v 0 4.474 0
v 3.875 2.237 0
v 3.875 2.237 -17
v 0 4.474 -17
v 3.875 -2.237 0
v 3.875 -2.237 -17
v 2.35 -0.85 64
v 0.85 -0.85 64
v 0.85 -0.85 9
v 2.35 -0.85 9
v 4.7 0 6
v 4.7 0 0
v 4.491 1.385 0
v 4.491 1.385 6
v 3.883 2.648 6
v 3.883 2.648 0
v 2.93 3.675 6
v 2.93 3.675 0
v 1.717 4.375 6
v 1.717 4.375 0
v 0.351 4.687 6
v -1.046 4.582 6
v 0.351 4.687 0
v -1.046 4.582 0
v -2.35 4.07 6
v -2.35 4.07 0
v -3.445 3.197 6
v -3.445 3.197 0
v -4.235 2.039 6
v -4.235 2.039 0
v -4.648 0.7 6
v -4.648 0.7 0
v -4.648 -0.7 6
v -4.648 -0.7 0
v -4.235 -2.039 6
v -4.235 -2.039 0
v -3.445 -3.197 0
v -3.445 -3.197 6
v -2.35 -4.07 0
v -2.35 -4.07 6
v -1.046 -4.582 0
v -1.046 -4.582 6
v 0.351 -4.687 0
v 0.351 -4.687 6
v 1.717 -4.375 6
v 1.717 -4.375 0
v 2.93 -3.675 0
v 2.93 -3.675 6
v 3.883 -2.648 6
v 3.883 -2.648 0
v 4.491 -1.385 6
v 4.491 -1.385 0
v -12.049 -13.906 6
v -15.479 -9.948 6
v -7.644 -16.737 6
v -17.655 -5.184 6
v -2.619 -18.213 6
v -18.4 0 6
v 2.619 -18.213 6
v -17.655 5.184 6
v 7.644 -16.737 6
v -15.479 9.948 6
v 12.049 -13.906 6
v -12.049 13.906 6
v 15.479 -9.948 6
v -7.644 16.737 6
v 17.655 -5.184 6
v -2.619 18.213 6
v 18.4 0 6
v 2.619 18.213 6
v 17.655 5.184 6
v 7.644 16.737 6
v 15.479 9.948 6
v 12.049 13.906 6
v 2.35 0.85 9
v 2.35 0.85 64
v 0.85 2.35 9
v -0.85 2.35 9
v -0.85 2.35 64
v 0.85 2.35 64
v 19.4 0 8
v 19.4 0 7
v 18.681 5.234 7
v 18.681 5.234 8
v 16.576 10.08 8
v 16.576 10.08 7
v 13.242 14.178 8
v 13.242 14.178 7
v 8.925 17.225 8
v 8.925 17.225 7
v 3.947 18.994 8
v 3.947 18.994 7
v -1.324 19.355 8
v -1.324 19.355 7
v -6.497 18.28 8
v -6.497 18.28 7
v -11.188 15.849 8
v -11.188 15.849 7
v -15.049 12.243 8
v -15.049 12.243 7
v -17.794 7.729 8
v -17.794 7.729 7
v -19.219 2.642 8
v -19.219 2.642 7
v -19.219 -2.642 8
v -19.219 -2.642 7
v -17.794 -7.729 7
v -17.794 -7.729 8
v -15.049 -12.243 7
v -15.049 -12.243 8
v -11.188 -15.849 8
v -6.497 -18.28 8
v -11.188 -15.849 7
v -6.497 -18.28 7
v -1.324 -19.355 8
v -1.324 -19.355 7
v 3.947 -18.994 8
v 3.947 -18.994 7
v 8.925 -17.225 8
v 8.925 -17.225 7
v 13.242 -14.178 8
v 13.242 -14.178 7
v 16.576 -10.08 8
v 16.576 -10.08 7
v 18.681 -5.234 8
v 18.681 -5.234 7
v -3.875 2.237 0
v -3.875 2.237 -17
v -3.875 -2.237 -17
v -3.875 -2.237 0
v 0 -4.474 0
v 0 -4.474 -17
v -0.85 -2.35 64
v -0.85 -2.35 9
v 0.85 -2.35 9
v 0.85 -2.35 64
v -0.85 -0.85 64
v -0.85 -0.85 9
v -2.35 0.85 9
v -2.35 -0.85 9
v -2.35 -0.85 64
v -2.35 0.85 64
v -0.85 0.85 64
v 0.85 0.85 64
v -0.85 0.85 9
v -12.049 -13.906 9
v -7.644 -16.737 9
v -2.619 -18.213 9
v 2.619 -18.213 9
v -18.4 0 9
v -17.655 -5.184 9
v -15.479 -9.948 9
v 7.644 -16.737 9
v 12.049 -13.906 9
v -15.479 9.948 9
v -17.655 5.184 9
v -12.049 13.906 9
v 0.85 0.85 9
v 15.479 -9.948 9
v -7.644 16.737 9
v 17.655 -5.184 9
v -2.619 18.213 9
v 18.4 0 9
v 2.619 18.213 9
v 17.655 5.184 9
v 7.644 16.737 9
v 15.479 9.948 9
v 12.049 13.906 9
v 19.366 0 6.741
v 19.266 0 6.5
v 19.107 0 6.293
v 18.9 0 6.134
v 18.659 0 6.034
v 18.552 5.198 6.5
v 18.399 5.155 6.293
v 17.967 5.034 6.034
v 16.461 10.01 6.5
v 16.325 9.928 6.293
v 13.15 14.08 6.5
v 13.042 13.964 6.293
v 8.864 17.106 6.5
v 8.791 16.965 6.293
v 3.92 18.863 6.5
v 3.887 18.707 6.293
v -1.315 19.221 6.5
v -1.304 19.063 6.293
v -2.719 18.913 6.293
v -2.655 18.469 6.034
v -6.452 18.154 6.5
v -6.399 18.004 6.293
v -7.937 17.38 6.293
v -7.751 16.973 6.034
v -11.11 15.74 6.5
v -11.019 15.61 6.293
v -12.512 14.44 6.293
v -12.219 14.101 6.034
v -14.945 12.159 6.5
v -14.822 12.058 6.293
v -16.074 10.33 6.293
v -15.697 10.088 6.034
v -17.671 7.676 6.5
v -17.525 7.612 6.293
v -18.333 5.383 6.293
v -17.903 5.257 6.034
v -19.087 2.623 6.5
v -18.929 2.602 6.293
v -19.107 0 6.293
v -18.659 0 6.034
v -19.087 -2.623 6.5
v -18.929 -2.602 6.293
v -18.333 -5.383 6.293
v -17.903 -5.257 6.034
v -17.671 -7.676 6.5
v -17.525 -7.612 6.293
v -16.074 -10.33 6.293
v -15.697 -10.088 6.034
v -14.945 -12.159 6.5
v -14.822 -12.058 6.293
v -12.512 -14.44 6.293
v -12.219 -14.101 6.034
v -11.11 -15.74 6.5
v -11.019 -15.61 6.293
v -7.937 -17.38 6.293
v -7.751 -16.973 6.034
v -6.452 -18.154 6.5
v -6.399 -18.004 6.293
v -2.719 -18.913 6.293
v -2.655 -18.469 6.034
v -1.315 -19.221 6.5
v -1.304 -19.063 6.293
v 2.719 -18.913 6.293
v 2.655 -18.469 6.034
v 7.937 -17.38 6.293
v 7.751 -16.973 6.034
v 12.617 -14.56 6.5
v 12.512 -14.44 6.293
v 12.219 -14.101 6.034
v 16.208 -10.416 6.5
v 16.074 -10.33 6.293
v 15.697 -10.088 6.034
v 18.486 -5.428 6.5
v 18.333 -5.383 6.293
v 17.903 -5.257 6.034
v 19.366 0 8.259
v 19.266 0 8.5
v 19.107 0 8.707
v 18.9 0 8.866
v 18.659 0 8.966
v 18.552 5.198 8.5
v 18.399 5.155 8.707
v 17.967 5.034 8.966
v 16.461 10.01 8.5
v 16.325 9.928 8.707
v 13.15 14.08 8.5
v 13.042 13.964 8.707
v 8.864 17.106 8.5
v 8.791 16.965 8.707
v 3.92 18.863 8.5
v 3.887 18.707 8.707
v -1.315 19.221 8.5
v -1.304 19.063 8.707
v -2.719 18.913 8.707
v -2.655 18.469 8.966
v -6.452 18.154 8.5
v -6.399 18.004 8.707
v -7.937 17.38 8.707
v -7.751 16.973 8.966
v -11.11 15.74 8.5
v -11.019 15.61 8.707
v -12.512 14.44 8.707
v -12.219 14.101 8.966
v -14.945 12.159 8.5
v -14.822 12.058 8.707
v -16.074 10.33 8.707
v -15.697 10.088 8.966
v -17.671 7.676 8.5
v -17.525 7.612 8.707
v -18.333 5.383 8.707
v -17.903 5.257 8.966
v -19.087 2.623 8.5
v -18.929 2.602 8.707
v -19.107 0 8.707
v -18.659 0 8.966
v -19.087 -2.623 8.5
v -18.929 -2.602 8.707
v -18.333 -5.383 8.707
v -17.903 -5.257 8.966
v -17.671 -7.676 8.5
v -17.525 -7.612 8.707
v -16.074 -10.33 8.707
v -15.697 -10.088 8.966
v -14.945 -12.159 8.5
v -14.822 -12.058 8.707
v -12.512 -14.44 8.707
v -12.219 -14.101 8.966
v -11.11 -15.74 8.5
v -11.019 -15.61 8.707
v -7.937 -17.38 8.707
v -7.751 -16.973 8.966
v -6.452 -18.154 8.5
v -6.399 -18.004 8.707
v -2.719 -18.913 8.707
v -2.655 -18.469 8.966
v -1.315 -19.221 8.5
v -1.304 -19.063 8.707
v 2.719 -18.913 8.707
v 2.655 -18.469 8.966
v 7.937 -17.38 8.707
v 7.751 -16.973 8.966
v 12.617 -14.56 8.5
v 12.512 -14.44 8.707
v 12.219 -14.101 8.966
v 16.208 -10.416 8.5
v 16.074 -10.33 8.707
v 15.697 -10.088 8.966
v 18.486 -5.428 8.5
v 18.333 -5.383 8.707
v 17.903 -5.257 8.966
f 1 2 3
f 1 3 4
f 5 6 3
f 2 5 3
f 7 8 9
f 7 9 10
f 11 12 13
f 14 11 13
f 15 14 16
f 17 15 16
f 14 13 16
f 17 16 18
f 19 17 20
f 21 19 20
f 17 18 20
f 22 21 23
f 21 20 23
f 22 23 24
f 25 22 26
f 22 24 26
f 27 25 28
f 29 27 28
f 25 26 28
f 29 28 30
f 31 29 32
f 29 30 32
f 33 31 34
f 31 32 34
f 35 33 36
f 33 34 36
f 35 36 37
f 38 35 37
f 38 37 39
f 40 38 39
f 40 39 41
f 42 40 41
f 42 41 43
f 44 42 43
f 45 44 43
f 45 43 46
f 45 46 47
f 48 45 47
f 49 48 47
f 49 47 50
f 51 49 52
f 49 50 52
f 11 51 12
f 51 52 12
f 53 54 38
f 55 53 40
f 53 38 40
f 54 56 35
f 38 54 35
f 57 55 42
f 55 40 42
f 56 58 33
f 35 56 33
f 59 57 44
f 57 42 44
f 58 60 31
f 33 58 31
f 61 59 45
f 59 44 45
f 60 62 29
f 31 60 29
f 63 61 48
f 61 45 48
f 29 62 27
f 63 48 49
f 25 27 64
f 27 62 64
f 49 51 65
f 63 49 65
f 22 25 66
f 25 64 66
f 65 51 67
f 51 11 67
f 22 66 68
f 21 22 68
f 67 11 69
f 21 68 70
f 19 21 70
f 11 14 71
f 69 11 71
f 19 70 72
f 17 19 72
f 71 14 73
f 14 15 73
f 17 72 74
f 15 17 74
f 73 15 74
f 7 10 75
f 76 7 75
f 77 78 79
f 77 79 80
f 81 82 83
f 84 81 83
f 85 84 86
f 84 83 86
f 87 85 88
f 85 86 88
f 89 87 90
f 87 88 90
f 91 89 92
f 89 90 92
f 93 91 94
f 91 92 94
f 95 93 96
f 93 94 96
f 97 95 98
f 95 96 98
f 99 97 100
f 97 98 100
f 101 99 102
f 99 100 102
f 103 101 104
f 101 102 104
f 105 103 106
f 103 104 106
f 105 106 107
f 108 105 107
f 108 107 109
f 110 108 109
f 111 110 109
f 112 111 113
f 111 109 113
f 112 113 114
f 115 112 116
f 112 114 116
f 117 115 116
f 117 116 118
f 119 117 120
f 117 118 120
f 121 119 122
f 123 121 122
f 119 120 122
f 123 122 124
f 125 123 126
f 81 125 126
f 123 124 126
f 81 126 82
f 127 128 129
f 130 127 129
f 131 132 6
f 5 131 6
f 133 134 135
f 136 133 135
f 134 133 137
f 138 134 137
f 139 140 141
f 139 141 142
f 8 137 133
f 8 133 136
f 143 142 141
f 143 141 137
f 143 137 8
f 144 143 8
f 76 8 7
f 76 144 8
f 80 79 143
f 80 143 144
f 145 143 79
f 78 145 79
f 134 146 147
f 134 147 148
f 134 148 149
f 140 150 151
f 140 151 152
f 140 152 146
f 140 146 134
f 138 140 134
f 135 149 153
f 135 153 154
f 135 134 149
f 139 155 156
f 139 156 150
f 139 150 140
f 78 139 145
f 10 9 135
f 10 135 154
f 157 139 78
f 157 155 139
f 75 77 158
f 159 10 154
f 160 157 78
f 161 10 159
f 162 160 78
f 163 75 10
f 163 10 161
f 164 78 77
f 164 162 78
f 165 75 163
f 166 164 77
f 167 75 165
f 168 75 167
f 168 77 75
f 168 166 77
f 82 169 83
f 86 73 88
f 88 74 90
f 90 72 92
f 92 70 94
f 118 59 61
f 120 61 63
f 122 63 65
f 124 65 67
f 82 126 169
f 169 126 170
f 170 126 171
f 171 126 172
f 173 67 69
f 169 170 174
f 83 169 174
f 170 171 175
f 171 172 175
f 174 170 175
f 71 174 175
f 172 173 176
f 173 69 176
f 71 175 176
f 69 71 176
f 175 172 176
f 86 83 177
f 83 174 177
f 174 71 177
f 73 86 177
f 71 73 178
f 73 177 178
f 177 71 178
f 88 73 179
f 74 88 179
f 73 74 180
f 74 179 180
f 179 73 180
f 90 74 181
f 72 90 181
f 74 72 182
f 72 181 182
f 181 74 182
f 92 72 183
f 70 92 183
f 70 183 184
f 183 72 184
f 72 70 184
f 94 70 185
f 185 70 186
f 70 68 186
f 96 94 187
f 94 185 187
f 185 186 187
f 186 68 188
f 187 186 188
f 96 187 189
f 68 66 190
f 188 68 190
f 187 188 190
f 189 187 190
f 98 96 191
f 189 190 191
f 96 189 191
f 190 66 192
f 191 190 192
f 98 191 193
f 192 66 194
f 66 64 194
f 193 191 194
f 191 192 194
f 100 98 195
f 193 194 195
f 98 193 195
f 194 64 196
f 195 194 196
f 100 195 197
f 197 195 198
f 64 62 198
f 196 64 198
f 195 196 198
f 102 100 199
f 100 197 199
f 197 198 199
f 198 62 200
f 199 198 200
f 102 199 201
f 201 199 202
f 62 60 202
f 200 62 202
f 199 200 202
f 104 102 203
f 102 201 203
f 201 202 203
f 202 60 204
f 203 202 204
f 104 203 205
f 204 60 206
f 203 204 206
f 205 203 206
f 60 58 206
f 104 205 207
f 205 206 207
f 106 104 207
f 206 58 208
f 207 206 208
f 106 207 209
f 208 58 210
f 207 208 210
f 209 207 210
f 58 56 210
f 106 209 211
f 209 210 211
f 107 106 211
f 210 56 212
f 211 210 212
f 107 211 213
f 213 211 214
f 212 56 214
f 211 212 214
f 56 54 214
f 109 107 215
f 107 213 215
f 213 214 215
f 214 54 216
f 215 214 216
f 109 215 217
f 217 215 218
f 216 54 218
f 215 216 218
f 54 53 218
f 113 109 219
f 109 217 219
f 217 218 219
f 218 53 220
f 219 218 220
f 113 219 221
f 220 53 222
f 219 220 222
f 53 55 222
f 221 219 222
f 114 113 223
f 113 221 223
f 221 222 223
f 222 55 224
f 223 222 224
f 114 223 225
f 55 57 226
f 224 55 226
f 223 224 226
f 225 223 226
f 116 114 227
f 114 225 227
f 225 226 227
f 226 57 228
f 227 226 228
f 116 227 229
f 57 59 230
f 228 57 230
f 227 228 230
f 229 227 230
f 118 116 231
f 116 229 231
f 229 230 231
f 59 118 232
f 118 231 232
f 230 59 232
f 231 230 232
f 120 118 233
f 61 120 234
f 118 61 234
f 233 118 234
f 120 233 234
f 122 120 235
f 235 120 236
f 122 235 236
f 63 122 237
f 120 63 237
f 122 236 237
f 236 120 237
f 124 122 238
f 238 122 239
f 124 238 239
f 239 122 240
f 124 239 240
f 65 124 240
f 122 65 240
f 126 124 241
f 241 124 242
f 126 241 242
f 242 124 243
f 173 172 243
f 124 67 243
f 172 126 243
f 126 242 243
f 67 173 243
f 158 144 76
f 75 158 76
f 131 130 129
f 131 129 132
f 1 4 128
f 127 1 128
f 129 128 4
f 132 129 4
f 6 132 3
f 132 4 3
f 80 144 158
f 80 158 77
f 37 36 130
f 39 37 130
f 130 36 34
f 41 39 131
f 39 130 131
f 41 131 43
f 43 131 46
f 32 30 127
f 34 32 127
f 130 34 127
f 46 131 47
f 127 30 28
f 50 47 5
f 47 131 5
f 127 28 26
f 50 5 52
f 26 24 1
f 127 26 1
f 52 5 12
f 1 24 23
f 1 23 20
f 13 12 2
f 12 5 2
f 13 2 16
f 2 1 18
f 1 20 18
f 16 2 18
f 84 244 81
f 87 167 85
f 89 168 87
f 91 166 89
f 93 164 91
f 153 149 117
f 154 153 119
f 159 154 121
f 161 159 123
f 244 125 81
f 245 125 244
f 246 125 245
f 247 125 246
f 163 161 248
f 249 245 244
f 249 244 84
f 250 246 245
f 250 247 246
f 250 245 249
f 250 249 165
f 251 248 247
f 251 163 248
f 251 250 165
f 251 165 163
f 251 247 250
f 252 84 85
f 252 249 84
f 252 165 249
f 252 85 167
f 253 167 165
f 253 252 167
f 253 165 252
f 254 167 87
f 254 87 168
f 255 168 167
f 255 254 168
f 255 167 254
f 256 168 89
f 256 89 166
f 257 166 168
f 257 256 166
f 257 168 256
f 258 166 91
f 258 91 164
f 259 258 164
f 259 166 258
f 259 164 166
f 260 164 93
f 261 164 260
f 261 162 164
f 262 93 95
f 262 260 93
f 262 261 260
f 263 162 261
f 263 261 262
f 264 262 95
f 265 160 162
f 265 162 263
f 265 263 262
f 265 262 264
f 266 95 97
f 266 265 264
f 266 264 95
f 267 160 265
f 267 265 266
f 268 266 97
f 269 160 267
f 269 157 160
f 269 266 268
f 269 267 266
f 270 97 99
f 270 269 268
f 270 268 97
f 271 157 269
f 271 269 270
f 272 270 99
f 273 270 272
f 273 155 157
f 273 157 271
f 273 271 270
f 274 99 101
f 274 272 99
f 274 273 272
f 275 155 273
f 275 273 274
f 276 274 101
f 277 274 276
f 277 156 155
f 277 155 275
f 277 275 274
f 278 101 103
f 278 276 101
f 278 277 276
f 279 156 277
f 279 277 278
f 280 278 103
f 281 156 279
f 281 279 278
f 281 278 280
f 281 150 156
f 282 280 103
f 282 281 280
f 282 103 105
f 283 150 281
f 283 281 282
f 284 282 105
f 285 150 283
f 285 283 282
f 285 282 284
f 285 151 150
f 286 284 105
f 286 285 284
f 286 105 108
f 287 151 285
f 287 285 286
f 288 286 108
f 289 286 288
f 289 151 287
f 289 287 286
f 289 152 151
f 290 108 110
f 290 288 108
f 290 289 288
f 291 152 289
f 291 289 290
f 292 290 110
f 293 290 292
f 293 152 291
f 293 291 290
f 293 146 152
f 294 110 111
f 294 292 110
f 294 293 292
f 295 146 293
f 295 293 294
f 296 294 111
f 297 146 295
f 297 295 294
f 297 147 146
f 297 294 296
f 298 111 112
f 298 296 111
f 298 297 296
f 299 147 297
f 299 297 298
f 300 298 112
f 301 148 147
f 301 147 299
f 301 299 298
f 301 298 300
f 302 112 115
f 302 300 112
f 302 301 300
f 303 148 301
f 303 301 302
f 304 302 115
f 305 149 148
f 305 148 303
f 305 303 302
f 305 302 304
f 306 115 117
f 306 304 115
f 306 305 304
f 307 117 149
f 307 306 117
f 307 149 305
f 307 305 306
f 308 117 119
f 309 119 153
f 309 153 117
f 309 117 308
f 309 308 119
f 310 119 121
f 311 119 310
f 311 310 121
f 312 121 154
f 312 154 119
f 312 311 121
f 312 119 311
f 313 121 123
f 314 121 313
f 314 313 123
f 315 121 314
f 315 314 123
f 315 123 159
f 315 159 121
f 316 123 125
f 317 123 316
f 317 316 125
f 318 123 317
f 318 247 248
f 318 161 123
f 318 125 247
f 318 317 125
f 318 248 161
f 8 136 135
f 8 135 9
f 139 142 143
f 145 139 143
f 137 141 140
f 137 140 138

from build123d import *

# Parameters (mm, degrees)
F1_DEPTH = 17
F2_R     = 4.7
F3_DEPTH = 6
F4_R     = 19.4
F5_DEPTH = 3
F6_W     = 1.5
F6_H     = 1.7
F6_W_2   = 1.7
F6_H_2   = 1.5
F7_DEPTH = 55
F8_R     = 1


with BuildPart() as f1:
    # F0 (on Top) → F1 (new body)
    with BuildSketch(Plane.XY):
        Polygon((3.875, -2.2372322931), (3.875, 2.2372322931), (0, 4.4744645862), (-3.875, 2.2372322931), (-3.875, -2.2372322931), (0, -4.4744645862), align=None)
    extrude(amount=-F1_DEPTH)

    # F2 (on face) → F3 (join)
    with BuildSketch(Plane.XY):
        Circle(F2_R)
    extrude(amount=F3_DEPTH)

    # F4 (on face) → F5 (join)
    with BuildSketch(Plane.XY.offset(6)):
        Circle(F4_R)
    extrude(amount=F5_DEPTH)

    # F6 (on face) → F7 (join)
    with BuildSketch(Plane.XY.offset(9)):
        with Locations((-1.6, 0)):
            Rectangle(F6_W, F6_H)
        with Locations((0, 1.6)):
            Rectangle(F6_W_2, F6_H_2)
        Rectangle(F6_W_2, F6_H)
        with Locations((1.6, 0)):
            Rectangle(F6_W, F6_H)
        with Locations((0, -1.6)):
            Rectangle(F6_W_2, F6_H_2)
    extrude(amount=F7_DEPTH)

    # F8
    f8_edges = [f1.edges().sort_by_distance(p)[0] for p in [
        (-19.4, 0, 6),
        (-19.4, 0, 9),
    ]]
    fillet(f8_edges, radius=F8_R)


solid = f1.part
